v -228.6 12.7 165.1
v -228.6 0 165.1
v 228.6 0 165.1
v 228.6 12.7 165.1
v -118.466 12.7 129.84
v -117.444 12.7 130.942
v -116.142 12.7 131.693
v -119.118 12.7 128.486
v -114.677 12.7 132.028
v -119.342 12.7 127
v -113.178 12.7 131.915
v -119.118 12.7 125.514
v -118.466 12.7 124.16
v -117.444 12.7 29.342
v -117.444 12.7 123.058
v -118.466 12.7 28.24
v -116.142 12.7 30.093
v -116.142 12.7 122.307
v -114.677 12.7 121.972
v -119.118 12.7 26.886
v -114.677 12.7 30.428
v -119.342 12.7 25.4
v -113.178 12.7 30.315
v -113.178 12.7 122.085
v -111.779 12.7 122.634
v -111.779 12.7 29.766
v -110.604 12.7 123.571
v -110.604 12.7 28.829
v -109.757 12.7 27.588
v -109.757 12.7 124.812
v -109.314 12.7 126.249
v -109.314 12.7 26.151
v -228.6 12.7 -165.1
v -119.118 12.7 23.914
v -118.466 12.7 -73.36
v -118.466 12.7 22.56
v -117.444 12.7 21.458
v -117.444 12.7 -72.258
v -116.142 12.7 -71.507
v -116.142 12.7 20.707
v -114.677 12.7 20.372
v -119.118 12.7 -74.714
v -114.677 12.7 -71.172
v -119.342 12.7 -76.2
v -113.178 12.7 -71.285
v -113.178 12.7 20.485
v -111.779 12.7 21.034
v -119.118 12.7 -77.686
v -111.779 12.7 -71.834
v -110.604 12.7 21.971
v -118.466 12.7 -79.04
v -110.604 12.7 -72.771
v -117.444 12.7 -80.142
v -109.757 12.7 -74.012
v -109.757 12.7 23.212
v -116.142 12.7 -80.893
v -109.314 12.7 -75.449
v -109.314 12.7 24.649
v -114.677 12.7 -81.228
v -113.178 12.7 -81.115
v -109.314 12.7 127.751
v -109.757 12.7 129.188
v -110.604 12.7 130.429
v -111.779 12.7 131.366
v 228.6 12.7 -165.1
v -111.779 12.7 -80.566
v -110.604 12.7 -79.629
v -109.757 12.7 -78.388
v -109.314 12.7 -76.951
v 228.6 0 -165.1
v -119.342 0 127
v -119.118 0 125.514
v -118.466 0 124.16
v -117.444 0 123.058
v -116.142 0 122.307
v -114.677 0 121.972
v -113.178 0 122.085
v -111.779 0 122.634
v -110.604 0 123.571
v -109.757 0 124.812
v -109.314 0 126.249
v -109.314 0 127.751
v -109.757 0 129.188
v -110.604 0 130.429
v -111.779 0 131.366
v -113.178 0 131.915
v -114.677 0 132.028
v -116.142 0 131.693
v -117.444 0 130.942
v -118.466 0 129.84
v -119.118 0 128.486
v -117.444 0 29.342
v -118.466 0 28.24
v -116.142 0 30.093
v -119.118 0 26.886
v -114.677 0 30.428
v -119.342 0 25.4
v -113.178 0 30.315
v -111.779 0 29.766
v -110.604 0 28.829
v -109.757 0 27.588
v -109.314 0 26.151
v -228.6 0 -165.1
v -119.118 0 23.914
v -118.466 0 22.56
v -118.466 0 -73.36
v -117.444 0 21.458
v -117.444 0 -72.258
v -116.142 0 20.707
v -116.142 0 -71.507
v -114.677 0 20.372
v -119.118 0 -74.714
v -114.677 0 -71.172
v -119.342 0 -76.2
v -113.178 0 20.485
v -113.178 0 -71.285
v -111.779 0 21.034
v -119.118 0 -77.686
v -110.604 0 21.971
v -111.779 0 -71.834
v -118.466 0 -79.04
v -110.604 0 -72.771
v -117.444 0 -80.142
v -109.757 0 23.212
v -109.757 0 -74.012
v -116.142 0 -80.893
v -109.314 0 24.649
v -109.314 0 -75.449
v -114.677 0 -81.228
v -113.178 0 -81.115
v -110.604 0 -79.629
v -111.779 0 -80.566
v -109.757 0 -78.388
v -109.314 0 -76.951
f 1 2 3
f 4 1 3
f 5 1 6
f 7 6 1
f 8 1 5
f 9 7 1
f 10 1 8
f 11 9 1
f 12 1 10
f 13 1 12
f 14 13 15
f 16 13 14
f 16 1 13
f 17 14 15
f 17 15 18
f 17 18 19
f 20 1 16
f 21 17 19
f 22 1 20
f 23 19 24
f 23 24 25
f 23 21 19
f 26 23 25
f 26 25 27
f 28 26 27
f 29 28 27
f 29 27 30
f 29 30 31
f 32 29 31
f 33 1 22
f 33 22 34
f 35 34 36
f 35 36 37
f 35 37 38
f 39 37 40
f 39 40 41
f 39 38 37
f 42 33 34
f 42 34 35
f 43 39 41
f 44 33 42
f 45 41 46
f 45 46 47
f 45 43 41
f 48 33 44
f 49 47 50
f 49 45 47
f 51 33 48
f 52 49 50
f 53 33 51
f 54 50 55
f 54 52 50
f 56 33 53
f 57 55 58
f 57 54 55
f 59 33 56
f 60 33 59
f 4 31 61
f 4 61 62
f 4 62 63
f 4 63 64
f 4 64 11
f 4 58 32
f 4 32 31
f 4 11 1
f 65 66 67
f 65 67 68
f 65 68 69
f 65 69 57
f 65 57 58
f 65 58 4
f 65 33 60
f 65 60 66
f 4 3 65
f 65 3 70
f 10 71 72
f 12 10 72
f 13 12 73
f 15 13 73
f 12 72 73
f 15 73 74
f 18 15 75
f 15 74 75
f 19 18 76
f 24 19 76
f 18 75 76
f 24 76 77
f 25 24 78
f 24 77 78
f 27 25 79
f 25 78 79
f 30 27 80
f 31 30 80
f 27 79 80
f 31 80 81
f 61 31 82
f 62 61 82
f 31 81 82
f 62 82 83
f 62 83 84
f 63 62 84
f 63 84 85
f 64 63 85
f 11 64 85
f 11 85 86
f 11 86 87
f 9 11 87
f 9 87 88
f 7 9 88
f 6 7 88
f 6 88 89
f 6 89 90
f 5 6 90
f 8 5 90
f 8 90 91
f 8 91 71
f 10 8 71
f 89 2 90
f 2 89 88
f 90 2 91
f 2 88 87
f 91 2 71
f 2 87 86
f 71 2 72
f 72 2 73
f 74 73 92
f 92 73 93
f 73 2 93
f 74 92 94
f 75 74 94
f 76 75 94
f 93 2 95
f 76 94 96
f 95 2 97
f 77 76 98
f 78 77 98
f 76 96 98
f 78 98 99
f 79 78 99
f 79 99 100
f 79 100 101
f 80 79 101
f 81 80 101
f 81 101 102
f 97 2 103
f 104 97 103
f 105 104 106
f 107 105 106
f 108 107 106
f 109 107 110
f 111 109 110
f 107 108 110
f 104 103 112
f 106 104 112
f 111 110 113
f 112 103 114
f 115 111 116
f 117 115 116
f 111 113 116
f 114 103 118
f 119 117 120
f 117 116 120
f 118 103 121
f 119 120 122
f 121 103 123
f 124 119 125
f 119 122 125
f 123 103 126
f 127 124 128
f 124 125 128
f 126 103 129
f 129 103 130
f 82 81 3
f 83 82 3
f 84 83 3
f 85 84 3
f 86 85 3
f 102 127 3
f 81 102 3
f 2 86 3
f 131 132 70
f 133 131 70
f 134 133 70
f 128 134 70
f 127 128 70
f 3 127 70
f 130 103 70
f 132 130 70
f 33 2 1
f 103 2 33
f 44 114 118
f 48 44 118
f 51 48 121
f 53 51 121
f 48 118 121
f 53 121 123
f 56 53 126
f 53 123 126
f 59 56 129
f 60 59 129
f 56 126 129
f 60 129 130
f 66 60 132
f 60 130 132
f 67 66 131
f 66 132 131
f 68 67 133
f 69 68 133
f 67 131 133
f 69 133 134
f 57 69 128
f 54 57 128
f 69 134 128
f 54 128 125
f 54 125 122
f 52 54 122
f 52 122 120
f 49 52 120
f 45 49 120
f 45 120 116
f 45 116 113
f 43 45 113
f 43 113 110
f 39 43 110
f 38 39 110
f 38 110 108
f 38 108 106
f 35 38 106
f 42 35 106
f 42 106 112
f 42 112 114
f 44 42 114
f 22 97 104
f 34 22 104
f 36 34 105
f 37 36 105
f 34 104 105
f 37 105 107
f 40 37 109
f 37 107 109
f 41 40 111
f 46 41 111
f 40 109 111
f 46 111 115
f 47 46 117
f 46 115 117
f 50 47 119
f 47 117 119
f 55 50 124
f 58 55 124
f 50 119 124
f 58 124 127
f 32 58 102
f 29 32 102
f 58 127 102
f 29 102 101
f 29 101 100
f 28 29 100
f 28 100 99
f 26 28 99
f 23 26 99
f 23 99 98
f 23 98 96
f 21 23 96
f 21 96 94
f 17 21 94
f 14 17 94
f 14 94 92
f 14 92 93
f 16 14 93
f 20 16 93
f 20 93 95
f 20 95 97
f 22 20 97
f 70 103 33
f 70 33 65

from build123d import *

# Parameters (mm, degrees)
SKETCH1_W               = 457.2
SKETCH1_H               = 330.2
BOSS_EXTRUDE1_DEPTH     = 12.7
F_3_8_CLEARANCE_HOLE1_D = 10.0838


with BuildPart() as part:
    # Sketch1 → Boss-Extrude1 (new body)
    with BuildSketch(Plane(origin=(0, 0, 0), x_dir=(1, 0, 0), z_dir=(0, 1, 0))):
        Rectangle(SKETCH1_W, SKETCH1_H)
    extrude(amount=BOSS_EXTRUDE1_DEPTH)

    # 3/8 Clearance Hole1 (through all)
    with Locations(Plane(origin=(0, 12.7, -165.1), x_dir=(1, 0, 0), z_dir=(0, 1, 0))):
        with Locations((-114.300000003, -88.9), (-114.300000003, -190.5), (-114.300000003, -292.1)):
            Hole(F_3_8_CLEARANCE_HOLE1_D / 2)


solid = part.part
